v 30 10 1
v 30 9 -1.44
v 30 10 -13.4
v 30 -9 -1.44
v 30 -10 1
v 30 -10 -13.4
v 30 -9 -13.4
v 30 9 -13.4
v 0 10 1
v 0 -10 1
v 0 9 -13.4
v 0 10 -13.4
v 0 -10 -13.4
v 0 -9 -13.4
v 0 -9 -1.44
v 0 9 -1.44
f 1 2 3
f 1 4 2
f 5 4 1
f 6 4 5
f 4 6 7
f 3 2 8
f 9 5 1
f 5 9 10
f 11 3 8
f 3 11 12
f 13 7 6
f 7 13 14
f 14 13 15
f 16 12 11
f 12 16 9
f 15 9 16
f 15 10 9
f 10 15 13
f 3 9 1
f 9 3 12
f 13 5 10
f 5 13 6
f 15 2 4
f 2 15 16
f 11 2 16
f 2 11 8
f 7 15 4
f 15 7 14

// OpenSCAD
// fitting between mobo bottom plugs

zh = 15 - 2 * 0.3;
midheight = 20;
bottom = -10;

module bottom(){
  cube([30, midheight, zh]);
}

difference(){
  translate([0, bottom, -(zh - 1)]){
    bottom();
  }
  translate([0, bottom + 1, -zh]){
    scale([1, 0.9, 0.9]){
      bottom();
    }
  }
}
